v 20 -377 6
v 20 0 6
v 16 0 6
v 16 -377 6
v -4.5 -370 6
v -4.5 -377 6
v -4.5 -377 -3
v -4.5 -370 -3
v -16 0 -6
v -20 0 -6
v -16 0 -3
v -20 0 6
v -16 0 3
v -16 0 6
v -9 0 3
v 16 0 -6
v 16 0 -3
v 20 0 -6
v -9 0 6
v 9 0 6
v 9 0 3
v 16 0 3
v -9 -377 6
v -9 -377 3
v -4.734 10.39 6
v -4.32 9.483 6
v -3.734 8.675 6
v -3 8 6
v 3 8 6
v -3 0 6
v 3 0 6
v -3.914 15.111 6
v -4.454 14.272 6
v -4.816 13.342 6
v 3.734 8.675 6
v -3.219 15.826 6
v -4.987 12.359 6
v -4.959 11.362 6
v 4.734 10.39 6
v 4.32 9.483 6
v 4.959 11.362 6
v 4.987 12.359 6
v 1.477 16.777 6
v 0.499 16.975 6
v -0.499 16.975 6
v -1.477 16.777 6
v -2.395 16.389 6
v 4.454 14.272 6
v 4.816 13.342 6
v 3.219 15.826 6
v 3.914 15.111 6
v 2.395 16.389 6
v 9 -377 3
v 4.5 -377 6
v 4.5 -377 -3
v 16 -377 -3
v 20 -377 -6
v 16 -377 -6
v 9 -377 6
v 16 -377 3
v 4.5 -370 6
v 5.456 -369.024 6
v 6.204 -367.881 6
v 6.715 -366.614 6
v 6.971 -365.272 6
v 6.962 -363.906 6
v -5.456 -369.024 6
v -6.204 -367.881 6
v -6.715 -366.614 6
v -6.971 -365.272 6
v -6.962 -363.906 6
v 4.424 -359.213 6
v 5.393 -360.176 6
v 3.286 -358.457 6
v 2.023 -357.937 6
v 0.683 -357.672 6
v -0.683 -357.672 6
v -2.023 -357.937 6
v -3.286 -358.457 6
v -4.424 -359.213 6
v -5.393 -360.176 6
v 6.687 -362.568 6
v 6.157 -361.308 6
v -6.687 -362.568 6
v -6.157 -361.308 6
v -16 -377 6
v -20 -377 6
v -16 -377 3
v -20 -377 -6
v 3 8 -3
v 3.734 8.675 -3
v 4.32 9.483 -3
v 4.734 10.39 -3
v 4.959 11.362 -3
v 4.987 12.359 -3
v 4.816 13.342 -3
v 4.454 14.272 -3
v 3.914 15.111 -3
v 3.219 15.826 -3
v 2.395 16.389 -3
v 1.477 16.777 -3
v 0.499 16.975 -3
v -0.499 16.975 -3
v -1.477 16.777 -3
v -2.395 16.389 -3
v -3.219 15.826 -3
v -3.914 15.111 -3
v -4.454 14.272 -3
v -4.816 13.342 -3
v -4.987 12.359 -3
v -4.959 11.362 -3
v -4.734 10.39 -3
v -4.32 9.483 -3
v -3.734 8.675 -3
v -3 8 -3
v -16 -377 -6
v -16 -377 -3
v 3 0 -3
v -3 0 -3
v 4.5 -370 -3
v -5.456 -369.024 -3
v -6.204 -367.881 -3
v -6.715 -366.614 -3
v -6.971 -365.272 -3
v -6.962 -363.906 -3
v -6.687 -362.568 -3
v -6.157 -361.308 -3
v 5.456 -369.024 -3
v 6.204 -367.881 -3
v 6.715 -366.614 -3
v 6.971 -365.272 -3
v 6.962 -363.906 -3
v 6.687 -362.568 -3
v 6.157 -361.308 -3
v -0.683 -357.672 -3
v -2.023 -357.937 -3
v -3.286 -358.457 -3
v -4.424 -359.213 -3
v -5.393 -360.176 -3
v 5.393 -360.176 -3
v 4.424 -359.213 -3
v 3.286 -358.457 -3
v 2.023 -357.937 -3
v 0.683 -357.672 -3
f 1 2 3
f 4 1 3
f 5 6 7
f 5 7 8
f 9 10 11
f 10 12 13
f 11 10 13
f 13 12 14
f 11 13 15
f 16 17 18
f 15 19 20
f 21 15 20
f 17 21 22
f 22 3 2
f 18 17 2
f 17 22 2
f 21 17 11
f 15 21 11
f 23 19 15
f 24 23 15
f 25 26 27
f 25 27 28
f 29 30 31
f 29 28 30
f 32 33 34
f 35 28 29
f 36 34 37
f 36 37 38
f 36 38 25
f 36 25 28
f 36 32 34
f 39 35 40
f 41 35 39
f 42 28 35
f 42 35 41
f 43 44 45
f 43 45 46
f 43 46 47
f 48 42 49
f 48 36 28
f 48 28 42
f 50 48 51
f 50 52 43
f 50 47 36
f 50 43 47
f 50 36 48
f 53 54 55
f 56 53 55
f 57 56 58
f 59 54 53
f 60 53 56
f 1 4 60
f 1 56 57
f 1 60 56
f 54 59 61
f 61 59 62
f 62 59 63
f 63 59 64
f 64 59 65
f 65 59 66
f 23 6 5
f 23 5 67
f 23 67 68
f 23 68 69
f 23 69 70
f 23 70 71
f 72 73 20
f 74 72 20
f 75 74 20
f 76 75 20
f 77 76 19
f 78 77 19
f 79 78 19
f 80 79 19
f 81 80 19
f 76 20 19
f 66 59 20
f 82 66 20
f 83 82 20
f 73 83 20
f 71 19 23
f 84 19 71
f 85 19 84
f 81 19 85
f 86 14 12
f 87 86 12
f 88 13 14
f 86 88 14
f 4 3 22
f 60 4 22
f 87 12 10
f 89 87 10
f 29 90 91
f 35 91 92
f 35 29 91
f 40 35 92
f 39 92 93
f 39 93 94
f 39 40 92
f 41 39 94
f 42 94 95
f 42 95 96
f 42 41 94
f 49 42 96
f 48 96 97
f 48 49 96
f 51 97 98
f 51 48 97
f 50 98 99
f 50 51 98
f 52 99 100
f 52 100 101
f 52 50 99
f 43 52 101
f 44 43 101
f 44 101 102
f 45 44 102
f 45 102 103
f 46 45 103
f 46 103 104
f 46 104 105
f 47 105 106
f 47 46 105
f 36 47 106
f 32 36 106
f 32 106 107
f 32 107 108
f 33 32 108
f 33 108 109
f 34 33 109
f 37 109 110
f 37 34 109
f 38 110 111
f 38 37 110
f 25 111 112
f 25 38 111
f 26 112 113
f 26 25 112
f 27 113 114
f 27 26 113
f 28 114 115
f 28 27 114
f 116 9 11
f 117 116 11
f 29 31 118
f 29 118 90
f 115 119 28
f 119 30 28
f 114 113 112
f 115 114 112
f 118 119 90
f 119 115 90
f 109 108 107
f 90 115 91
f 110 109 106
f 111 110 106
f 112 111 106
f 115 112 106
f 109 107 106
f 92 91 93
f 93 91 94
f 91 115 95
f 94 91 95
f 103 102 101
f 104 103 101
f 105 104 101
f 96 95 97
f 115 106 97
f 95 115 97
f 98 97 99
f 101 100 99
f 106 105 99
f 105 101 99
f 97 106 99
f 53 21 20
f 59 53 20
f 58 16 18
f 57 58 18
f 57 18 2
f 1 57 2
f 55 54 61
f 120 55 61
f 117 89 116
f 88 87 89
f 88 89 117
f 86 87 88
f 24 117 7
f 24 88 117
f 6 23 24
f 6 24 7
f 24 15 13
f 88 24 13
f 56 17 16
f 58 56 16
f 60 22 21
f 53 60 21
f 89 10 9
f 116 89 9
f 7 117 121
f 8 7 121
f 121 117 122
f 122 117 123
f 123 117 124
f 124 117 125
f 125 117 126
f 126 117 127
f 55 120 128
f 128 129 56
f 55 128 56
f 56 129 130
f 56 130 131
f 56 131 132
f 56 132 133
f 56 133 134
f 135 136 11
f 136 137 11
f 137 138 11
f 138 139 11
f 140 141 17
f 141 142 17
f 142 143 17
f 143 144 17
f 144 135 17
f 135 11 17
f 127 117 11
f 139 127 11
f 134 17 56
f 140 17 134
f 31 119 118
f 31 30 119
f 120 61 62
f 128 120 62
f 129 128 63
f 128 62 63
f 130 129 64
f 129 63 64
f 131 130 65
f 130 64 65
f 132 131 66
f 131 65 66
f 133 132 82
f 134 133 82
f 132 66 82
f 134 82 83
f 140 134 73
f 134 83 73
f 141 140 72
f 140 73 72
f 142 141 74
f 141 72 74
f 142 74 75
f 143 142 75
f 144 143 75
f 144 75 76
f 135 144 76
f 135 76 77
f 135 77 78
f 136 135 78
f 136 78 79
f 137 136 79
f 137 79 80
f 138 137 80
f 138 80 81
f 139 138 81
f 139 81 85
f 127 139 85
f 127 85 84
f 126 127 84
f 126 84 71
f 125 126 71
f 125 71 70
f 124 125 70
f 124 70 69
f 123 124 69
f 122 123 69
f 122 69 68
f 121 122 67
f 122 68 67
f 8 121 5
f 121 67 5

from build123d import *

# Parameters (mm, degrees)
PAD_DEPTH         = 377
POCKET_DEPTH      = 12.001
PAD001_DEPTH      = 6
PAD001_DEPTH_BACK = 3


with BuildPart() as body:
    # Sketch → Pad (new body)
    with BuildSketch(Plane.XZ):
        Polygon((-20, 6), (-20, -6), (-16, -6), (-16, -3), (-9, -3), (9, -3), (16, -3), (16, -6), (20, -6), (20, 6), (16, 6), (16, 3), (9, 3), (9, 6), (-9, 6), (-9, 3), (-16, 3), (-16, 6), align=None)
    extrude(amount=PAD_DEPTH)

    # Sketch002 (on Face14 of Pad) → Pocket (cut, through all)
    with BuildSketch(Plane(origin=(0, 0, 6), x_dir=(-1, 0, 0), z_dir=(0, 0, 1))):
        with BuildLine():
            Line((-4.5, 377), (4.5, 377))
            Line((4.5, 377), (4.5, 370))
            ThreePointArc((-4.5, 370), (0, 357.638097), (4.5, 370))
            Line((-4.5, 377), (-4.5, 370))
        make_face()
    extrude(amount=-POCKET_DEPTH, mode=Mode.SUBTRACT)


with BuildPart() as body001:
    # Sketch001 → Pad001 (new body, two sides)
    with BuildSketch(Plane.XY) as pad001_sk:
        with BuildLine():
            Line((-3, 0), (3, 0))
            Line((3, 0), (3, 8))
            ThreePointArc((3, 8), (0, 17), (-3, 8))
            Line((-3, 0), (-3, 8))
        make_face()
    extrude(amount=PAD001_DEPTH)
    extrude(pad001_sk.sketch, amount=-PAD001_DEPTH_BACK)


solid = Compound([body.part, body001.part])
